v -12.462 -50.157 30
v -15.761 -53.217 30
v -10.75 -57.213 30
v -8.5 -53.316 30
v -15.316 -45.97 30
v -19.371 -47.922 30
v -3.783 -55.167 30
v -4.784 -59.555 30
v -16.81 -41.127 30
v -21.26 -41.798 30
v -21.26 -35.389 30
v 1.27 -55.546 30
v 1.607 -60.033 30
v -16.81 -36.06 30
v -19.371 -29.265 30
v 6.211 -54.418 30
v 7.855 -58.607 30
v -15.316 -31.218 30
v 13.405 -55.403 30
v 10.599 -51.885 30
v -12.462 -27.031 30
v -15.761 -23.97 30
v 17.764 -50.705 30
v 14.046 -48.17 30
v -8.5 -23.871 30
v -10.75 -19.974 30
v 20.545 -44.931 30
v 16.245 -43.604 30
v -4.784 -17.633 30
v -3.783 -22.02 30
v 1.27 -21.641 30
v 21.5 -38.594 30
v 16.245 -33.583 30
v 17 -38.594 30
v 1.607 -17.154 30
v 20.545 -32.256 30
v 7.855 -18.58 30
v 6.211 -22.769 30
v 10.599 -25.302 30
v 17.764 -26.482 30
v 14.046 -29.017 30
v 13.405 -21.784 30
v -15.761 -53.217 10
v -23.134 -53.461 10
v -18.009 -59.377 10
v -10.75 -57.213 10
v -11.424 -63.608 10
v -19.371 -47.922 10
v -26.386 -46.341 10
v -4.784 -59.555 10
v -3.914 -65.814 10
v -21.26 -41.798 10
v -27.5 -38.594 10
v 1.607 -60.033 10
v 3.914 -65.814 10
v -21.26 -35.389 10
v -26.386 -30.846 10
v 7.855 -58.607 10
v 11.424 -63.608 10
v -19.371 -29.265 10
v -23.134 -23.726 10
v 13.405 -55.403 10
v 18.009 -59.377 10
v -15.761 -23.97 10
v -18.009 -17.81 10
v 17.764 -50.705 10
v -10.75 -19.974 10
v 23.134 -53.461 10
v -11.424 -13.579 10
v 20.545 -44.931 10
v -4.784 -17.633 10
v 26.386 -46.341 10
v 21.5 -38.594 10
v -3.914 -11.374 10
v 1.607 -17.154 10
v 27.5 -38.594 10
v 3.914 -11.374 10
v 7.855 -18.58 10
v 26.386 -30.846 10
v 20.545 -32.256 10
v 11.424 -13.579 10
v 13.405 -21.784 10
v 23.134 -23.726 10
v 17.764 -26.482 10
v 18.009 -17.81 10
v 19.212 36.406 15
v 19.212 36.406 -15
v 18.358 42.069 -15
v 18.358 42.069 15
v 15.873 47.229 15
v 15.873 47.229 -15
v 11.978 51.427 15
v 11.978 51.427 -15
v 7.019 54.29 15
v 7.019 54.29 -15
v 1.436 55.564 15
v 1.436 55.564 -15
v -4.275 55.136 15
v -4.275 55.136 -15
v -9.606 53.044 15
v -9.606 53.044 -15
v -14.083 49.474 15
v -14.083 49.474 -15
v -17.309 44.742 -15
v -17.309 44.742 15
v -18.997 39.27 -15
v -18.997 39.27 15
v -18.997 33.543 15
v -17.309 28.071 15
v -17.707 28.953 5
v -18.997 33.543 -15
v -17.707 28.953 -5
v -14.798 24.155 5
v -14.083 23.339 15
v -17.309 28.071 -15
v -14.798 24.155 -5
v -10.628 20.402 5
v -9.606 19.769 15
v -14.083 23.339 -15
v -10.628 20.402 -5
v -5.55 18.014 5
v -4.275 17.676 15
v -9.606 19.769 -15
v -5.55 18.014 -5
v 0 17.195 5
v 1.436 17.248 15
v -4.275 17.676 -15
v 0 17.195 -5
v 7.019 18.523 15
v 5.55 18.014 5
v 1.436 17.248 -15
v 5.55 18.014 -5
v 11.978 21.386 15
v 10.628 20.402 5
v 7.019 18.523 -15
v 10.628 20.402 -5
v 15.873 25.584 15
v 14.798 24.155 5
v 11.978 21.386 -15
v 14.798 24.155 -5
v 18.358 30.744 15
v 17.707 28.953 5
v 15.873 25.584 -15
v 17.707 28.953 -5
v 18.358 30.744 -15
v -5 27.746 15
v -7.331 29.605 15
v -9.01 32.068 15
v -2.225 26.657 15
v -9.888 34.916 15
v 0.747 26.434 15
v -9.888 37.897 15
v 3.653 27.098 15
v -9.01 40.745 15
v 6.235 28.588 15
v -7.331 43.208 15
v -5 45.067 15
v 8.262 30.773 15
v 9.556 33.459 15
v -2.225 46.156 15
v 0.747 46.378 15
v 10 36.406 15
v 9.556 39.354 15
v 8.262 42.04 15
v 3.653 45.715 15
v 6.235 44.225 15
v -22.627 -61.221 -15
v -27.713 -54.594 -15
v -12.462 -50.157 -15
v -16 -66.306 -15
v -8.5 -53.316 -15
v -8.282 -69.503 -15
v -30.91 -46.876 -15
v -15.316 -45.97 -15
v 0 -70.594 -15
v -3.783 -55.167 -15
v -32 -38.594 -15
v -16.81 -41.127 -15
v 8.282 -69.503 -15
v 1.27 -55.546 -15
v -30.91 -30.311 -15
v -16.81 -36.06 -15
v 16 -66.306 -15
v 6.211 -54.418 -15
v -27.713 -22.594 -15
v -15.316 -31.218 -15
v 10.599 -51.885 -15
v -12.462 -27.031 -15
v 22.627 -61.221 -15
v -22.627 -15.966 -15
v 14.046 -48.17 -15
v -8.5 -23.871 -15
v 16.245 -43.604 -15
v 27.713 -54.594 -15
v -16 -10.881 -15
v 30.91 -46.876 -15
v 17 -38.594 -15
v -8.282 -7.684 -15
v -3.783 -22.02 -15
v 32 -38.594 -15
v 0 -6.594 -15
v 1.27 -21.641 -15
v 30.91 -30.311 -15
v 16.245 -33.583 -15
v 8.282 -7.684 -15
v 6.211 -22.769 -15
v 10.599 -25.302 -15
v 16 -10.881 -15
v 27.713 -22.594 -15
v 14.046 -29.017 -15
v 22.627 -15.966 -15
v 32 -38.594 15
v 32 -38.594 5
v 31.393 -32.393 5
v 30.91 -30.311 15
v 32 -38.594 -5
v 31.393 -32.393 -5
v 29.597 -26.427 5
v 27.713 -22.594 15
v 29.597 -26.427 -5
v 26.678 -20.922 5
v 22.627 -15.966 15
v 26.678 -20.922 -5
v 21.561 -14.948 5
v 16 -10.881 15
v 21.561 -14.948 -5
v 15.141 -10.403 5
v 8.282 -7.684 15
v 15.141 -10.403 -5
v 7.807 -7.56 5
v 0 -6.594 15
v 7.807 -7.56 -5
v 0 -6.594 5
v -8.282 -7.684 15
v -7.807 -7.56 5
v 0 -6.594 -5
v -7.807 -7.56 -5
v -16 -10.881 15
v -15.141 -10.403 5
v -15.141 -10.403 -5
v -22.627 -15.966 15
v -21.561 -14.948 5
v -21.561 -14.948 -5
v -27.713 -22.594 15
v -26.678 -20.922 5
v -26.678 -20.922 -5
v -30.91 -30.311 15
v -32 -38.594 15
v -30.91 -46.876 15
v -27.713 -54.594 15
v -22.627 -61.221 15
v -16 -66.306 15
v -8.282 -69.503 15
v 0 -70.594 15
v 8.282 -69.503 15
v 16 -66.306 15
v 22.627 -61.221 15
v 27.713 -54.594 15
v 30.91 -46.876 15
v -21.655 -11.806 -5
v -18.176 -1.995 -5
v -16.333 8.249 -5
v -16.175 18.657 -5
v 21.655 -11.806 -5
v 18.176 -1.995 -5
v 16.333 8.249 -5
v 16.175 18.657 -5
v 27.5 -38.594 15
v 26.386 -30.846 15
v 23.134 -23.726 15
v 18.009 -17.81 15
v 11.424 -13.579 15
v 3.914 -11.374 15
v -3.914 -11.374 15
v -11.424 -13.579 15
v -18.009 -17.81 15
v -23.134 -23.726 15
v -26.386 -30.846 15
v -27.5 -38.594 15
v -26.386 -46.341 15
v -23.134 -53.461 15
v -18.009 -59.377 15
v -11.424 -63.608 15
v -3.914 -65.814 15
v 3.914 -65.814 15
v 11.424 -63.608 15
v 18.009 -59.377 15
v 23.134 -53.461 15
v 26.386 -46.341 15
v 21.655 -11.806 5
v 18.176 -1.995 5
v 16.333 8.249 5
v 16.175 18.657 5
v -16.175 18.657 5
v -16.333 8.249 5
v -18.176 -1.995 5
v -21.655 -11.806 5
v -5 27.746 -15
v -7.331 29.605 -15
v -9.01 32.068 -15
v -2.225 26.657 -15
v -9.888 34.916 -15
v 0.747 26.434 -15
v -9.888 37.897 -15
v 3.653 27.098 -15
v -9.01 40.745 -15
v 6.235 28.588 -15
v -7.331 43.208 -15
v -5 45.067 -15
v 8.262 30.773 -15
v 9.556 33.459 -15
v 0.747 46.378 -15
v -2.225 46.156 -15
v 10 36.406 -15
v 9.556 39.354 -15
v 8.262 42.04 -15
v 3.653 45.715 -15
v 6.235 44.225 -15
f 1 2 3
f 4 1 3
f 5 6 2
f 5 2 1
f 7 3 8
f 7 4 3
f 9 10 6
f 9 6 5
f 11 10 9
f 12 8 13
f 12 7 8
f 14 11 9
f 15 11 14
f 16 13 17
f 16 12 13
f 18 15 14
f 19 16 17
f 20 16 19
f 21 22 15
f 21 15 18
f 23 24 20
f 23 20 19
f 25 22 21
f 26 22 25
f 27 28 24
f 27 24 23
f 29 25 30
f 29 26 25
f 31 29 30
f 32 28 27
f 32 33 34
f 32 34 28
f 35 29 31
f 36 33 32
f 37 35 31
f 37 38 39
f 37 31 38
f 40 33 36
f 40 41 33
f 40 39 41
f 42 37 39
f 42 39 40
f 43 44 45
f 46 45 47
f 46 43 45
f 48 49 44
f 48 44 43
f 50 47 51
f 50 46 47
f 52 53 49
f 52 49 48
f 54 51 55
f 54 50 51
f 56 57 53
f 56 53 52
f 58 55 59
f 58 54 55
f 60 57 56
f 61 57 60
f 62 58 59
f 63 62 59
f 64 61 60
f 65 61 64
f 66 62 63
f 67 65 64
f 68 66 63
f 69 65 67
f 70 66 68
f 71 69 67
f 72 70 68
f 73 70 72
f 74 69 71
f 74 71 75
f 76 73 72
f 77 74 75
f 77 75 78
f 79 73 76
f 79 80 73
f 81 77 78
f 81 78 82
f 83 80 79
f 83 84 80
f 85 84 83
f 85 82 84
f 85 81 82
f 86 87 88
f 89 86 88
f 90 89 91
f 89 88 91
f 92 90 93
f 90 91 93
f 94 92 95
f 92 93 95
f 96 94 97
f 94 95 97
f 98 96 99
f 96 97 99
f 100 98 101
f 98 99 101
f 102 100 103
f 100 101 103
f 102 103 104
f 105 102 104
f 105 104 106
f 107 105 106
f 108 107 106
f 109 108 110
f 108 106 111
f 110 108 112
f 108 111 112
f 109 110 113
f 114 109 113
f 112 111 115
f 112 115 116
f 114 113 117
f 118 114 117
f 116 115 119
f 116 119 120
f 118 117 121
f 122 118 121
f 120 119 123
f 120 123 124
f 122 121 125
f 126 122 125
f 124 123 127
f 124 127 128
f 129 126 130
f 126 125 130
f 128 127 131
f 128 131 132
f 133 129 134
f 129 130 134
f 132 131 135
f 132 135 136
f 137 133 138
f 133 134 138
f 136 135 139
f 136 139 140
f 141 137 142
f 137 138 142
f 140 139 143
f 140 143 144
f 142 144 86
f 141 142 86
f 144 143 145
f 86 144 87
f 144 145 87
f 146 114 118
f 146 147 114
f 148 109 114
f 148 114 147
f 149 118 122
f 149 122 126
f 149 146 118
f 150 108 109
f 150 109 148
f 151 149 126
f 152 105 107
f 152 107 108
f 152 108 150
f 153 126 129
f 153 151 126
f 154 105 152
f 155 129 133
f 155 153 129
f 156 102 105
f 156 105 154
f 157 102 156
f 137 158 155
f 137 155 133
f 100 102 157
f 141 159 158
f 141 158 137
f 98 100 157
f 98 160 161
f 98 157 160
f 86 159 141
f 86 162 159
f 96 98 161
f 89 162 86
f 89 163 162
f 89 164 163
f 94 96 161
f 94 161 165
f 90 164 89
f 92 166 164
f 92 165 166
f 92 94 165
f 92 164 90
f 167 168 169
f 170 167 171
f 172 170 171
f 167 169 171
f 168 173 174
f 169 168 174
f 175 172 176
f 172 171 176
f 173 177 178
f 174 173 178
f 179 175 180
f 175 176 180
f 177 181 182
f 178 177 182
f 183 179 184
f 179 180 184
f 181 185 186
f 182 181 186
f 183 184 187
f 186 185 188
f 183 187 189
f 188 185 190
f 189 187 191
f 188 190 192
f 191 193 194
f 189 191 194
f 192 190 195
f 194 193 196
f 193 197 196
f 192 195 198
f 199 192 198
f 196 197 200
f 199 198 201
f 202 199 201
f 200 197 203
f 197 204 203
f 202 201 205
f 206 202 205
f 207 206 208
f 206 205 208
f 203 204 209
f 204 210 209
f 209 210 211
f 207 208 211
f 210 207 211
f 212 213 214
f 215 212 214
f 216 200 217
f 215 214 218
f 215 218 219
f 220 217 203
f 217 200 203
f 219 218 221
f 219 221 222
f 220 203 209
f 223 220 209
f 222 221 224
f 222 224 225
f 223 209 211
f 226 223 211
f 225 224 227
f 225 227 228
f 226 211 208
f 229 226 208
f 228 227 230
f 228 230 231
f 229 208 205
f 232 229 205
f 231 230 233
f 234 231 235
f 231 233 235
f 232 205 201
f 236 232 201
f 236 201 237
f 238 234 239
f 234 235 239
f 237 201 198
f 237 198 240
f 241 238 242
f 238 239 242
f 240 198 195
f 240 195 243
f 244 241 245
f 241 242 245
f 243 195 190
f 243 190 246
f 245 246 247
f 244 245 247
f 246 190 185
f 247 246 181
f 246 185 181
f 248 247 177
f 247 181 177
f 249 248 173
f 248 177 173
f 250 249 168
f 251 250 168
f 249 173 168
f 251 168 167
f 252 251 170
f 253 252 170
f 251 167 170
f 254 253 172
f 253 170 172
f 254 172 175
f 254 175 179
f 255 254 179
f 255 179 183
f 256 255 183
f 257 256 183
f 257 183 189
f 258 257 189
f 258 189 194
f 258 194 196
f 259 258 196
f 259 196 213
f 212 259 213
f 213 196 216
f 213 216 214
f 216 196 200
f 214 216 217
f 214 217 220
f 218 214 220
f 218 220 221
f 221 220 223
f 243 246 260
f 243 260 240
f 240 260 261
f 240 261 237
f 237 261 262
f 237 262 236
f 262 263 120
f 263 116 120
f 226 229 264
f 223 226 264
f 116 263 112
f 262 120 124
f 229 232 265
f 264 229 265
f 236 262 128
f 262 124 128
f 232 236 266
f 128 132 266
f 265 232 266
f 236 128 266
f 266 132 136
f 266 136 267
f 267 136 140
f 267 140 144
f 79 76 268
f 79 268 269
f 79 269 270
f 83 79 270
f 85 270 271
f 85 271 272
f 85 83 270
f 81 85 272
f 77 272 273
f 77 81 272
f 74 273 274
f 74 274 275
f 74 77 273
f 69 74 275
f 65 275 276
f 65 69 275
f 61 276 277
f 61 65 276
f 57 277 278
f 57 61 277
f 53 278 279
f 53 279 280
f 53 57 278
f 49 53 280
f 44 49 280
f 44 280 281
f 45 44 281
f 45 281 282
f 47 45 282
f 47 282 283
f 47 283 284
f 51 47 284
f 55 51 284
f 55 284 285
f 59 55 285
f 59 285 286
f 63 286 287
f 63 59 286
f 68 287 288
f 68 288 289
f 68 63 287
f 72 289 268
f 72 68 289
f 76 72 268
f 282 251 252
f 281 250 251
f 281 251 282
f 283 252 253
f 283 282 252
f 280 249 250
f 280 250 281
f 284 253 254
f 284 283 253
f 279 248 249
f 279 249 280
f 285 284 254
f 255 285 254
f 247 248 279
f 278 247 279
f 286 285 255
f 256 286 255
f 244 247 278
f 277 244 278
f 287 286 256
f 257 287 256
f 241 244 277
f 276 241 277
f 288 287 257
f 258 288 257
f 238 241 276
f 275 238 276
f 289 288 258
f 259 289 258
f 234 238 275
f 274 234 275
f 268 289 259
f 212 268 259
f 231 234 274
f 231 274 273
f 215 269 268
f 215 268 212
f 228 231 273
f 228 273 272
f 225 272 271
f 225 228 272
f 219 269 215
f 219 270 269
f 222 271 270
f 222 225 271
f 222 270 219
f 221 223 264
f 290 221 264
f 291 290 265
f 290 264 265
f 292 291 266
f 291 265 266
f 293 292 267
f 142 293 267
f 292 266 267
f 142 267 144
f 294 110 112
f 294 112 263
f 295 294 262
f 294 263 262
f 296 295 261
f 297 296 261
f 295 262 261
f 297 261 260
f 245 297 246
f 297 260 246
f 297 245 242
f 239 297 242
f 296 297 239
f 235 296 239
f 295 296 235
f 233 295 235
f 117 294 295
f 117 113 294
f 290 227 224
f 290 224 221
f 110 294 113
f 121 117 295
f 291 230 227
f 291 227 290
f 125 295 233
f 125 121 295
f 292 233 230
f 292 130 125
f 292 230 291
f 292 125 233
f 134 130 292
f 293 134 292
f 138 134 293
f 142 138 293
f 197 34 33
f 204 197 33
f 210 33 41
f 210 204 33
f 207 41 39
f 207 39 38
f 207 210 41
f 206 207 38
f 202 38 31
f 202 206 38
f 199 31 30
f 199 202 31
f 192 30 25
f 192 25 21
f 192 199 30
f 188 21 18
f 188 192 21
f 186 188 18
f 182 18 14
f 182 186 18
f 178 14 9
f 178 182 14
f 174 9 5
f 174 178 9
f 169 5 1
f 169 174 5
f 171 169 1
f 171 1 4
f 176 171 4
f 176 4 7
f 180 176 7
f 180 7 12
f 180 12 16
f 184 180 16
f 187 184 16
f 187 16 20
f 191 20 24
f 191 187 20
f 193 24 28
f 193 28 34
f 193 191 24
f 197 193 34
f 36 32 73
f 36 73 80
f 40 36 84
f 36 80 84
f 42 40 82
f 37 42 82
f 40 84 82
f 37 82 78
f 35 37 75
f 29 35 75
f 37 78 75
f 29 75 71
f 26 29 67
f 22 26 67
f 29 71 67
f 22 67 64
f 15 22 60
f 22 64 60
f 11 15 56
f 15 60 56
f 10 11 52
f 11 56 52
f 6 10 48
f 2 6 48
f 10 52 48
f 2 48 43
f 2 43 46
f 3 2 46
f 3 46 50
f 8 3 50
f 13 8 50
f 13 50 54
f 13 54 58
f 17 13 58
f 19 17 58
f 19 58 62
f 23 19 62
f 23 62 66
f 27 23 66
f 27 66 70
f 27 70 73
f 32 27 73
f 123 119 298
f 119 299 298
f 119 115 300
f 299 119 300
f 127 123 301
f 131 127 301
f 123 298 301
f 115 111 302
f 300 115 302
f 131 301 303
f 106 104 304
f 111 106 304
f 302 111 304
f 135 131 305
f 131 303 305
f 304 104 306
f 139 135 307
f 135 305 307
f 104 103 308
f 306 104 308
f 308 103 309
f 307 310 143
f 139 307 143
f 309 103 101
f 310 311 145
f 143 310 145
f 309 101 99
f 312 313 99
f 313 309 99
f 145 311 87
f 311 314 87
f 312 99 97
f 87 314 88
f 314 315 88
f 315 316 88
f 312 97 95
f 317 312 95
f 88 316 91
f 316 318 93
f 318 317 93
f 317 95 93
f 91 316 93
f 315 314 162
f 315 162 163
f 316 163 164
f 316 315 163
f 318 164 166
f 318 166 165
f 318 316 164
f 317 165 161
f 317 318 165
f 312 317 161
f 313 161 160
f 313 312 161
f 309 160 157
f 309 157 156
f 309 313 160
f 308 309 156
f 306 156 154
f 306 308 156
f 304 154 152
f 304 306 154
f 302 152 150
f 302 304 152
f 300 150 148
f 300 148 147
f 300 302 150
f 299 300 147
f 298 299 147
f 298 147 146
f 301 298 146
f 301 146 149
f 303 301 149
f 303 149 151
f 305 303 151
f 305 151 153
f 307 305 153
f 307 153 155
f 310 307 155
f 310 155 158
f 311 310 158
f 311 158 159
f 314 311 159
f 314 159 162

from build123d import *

# Parameters (mm, degrees)
BOSS_EXTRUDE1_DEPTH      = 5
BOSS_EXTRUDE1_DEPTH_BACK = 5
SKETCH1_R                = 27.5
SKETCH1_R_2              = 10
BOSS_EXTRUDE3_DEPTH      = 15
BOSS_EXTRUDE3_DEPTH_BACK = 15
SKETCH1_5_R              = 19.211681975
SKETCH1_5_R_2            = 10
SKETCH1_5_R_3            = 32
SKETCH1_5_R_4            = 27.5
BOSS_EXTRUDE4_DEPTH      = 30
BOSS_EXTRUDE4_DEPTH_BACK = 15
SKETCH1_6_R              = 21.5
SKETCH1_6_R_2            = 17
BOSS_EXTRUDE5_DEPTH      = 10
BOSS_EXTRUDE5_DEPTH_BACK = 15
SKETCH1_7_R              = 27.5
SKETCH1_7_R_2            = 21.5


with BuildPart() as part:
    # Sketch1 → Boss-Extrude1 (new, two sides: drawn at the far end of the back side and taken through both)
    with BuildSketch(Plane.XY.offset(-BOSS_EXTRUDE1_DEPTH_BACK)):
        with BuildLine():
            ThreePointArc((-26.678302647, -20.922495817), (0, -70.593606928), (26.678302647, -20.922495817))
            ThreePointArc((26.678302647, -20.922495817), (16.836772686, 4.320434327), (18.321243986, 31.373300703))
            ThreePointArc((18.321243986, 31.373300703), (0, 55.406393072), (-18.321243986, 31.373300703))
            ThreePointArc((-18.321243986, 31.373300703), (-16.836772686, 4.320434327), (-26.678302647, -20.922495817))
        make_face()
        with Locations((0, -38.593606928)):
            Circle(SKETCH1_R, mode=Mode.SUBTRACT)
        with Locations((0, 36.406393072)):
            Circle(SKETCH1_R_2, mode=Mode.SUBTRACT)
    extrude(amount=BOSS_EXTRUDE1_DEPTH + BOSS_EXTRUDE1_DEPTH_BACK)

    # Sketch1<5> → Boss-Extrude3 (add, two sides: drawn at the far end of the back side and taken through both)
    # profile 1 of 2: a face of its own
    with BuildSketch(Plane.XY.offset(-BOSS_EXTRUDE3_DEPTH_BACK)):
        with Locations((0, 36.406393072)):
            Circle(SKETCH1_5_R)
        with Locations((0, 36.406393072)):
            Circle(SKETCH1_5_R_2, mode=Mode.SUBTRACT)
    # profile 2 of 2: a face of its own
    with BuildSketch(Plane.XY.offset(-BOSS_EXTRUDE3_DEPTH_BACK)):
        with Locations((0, -38.593606928)):
            Circle(SKETCH1_5_R_3)
        with Locations((0, -38.593606928)):
            Circle(SKETCH1_5_R_4, mode=Mode.SUBTRACT)
    extrude(amount=BOSS_EXTRUDE3_DEPTH + BOSS_EXTRUDE3_DEPTH_BACK)



with BuildPart() as body_2:
    # Sketch1<6> → Boss-Extrude4 (new, two sides: drawn at the far end of the back side and taken through both)
    with BuildSketch(Plane.XY.offset(-BOSS_EXTRUDE4_DEPTH_BACK)):
        with Locations((0, -38.593606928)):
            Circle(SKETCH1_6_R)
        with Locations((0, -38.593606928)):
            Circle(SKETCH1_6_R_2, mode=Mode.SUBTRACT)
    extrude(amount=BOSS_EXTRUDE4_DEPTH + BOSS_EXTRUDE4_DEPTH_BACK)


with BuildPart() as part_1:
    add(part.part)

    add(body_2.part)  # Boss-Extrude5 merges body 2
    # Sketch1<7> → Boss-Extrude5 (add, two sides: drawn at the far end of the back side and taken through both)
    with BuildSketch(Plane.XY.offset(-BOSS_EXTRUDE5_DEPTH_BACK)):
        with Locations((0, -38.593606928)):
            Circle(SKETCH1_7_R)
        with Locations((0, -38.593606928)):
            Circle(SKETCH1_7_R_2, mode=Mode.SUBTRACT)
    extrude(amount=BOSS_EXTRUDE5_DEPTH + BOSS_EXTRUDE5_DEPTH_BACK)


solid = part_1.part
